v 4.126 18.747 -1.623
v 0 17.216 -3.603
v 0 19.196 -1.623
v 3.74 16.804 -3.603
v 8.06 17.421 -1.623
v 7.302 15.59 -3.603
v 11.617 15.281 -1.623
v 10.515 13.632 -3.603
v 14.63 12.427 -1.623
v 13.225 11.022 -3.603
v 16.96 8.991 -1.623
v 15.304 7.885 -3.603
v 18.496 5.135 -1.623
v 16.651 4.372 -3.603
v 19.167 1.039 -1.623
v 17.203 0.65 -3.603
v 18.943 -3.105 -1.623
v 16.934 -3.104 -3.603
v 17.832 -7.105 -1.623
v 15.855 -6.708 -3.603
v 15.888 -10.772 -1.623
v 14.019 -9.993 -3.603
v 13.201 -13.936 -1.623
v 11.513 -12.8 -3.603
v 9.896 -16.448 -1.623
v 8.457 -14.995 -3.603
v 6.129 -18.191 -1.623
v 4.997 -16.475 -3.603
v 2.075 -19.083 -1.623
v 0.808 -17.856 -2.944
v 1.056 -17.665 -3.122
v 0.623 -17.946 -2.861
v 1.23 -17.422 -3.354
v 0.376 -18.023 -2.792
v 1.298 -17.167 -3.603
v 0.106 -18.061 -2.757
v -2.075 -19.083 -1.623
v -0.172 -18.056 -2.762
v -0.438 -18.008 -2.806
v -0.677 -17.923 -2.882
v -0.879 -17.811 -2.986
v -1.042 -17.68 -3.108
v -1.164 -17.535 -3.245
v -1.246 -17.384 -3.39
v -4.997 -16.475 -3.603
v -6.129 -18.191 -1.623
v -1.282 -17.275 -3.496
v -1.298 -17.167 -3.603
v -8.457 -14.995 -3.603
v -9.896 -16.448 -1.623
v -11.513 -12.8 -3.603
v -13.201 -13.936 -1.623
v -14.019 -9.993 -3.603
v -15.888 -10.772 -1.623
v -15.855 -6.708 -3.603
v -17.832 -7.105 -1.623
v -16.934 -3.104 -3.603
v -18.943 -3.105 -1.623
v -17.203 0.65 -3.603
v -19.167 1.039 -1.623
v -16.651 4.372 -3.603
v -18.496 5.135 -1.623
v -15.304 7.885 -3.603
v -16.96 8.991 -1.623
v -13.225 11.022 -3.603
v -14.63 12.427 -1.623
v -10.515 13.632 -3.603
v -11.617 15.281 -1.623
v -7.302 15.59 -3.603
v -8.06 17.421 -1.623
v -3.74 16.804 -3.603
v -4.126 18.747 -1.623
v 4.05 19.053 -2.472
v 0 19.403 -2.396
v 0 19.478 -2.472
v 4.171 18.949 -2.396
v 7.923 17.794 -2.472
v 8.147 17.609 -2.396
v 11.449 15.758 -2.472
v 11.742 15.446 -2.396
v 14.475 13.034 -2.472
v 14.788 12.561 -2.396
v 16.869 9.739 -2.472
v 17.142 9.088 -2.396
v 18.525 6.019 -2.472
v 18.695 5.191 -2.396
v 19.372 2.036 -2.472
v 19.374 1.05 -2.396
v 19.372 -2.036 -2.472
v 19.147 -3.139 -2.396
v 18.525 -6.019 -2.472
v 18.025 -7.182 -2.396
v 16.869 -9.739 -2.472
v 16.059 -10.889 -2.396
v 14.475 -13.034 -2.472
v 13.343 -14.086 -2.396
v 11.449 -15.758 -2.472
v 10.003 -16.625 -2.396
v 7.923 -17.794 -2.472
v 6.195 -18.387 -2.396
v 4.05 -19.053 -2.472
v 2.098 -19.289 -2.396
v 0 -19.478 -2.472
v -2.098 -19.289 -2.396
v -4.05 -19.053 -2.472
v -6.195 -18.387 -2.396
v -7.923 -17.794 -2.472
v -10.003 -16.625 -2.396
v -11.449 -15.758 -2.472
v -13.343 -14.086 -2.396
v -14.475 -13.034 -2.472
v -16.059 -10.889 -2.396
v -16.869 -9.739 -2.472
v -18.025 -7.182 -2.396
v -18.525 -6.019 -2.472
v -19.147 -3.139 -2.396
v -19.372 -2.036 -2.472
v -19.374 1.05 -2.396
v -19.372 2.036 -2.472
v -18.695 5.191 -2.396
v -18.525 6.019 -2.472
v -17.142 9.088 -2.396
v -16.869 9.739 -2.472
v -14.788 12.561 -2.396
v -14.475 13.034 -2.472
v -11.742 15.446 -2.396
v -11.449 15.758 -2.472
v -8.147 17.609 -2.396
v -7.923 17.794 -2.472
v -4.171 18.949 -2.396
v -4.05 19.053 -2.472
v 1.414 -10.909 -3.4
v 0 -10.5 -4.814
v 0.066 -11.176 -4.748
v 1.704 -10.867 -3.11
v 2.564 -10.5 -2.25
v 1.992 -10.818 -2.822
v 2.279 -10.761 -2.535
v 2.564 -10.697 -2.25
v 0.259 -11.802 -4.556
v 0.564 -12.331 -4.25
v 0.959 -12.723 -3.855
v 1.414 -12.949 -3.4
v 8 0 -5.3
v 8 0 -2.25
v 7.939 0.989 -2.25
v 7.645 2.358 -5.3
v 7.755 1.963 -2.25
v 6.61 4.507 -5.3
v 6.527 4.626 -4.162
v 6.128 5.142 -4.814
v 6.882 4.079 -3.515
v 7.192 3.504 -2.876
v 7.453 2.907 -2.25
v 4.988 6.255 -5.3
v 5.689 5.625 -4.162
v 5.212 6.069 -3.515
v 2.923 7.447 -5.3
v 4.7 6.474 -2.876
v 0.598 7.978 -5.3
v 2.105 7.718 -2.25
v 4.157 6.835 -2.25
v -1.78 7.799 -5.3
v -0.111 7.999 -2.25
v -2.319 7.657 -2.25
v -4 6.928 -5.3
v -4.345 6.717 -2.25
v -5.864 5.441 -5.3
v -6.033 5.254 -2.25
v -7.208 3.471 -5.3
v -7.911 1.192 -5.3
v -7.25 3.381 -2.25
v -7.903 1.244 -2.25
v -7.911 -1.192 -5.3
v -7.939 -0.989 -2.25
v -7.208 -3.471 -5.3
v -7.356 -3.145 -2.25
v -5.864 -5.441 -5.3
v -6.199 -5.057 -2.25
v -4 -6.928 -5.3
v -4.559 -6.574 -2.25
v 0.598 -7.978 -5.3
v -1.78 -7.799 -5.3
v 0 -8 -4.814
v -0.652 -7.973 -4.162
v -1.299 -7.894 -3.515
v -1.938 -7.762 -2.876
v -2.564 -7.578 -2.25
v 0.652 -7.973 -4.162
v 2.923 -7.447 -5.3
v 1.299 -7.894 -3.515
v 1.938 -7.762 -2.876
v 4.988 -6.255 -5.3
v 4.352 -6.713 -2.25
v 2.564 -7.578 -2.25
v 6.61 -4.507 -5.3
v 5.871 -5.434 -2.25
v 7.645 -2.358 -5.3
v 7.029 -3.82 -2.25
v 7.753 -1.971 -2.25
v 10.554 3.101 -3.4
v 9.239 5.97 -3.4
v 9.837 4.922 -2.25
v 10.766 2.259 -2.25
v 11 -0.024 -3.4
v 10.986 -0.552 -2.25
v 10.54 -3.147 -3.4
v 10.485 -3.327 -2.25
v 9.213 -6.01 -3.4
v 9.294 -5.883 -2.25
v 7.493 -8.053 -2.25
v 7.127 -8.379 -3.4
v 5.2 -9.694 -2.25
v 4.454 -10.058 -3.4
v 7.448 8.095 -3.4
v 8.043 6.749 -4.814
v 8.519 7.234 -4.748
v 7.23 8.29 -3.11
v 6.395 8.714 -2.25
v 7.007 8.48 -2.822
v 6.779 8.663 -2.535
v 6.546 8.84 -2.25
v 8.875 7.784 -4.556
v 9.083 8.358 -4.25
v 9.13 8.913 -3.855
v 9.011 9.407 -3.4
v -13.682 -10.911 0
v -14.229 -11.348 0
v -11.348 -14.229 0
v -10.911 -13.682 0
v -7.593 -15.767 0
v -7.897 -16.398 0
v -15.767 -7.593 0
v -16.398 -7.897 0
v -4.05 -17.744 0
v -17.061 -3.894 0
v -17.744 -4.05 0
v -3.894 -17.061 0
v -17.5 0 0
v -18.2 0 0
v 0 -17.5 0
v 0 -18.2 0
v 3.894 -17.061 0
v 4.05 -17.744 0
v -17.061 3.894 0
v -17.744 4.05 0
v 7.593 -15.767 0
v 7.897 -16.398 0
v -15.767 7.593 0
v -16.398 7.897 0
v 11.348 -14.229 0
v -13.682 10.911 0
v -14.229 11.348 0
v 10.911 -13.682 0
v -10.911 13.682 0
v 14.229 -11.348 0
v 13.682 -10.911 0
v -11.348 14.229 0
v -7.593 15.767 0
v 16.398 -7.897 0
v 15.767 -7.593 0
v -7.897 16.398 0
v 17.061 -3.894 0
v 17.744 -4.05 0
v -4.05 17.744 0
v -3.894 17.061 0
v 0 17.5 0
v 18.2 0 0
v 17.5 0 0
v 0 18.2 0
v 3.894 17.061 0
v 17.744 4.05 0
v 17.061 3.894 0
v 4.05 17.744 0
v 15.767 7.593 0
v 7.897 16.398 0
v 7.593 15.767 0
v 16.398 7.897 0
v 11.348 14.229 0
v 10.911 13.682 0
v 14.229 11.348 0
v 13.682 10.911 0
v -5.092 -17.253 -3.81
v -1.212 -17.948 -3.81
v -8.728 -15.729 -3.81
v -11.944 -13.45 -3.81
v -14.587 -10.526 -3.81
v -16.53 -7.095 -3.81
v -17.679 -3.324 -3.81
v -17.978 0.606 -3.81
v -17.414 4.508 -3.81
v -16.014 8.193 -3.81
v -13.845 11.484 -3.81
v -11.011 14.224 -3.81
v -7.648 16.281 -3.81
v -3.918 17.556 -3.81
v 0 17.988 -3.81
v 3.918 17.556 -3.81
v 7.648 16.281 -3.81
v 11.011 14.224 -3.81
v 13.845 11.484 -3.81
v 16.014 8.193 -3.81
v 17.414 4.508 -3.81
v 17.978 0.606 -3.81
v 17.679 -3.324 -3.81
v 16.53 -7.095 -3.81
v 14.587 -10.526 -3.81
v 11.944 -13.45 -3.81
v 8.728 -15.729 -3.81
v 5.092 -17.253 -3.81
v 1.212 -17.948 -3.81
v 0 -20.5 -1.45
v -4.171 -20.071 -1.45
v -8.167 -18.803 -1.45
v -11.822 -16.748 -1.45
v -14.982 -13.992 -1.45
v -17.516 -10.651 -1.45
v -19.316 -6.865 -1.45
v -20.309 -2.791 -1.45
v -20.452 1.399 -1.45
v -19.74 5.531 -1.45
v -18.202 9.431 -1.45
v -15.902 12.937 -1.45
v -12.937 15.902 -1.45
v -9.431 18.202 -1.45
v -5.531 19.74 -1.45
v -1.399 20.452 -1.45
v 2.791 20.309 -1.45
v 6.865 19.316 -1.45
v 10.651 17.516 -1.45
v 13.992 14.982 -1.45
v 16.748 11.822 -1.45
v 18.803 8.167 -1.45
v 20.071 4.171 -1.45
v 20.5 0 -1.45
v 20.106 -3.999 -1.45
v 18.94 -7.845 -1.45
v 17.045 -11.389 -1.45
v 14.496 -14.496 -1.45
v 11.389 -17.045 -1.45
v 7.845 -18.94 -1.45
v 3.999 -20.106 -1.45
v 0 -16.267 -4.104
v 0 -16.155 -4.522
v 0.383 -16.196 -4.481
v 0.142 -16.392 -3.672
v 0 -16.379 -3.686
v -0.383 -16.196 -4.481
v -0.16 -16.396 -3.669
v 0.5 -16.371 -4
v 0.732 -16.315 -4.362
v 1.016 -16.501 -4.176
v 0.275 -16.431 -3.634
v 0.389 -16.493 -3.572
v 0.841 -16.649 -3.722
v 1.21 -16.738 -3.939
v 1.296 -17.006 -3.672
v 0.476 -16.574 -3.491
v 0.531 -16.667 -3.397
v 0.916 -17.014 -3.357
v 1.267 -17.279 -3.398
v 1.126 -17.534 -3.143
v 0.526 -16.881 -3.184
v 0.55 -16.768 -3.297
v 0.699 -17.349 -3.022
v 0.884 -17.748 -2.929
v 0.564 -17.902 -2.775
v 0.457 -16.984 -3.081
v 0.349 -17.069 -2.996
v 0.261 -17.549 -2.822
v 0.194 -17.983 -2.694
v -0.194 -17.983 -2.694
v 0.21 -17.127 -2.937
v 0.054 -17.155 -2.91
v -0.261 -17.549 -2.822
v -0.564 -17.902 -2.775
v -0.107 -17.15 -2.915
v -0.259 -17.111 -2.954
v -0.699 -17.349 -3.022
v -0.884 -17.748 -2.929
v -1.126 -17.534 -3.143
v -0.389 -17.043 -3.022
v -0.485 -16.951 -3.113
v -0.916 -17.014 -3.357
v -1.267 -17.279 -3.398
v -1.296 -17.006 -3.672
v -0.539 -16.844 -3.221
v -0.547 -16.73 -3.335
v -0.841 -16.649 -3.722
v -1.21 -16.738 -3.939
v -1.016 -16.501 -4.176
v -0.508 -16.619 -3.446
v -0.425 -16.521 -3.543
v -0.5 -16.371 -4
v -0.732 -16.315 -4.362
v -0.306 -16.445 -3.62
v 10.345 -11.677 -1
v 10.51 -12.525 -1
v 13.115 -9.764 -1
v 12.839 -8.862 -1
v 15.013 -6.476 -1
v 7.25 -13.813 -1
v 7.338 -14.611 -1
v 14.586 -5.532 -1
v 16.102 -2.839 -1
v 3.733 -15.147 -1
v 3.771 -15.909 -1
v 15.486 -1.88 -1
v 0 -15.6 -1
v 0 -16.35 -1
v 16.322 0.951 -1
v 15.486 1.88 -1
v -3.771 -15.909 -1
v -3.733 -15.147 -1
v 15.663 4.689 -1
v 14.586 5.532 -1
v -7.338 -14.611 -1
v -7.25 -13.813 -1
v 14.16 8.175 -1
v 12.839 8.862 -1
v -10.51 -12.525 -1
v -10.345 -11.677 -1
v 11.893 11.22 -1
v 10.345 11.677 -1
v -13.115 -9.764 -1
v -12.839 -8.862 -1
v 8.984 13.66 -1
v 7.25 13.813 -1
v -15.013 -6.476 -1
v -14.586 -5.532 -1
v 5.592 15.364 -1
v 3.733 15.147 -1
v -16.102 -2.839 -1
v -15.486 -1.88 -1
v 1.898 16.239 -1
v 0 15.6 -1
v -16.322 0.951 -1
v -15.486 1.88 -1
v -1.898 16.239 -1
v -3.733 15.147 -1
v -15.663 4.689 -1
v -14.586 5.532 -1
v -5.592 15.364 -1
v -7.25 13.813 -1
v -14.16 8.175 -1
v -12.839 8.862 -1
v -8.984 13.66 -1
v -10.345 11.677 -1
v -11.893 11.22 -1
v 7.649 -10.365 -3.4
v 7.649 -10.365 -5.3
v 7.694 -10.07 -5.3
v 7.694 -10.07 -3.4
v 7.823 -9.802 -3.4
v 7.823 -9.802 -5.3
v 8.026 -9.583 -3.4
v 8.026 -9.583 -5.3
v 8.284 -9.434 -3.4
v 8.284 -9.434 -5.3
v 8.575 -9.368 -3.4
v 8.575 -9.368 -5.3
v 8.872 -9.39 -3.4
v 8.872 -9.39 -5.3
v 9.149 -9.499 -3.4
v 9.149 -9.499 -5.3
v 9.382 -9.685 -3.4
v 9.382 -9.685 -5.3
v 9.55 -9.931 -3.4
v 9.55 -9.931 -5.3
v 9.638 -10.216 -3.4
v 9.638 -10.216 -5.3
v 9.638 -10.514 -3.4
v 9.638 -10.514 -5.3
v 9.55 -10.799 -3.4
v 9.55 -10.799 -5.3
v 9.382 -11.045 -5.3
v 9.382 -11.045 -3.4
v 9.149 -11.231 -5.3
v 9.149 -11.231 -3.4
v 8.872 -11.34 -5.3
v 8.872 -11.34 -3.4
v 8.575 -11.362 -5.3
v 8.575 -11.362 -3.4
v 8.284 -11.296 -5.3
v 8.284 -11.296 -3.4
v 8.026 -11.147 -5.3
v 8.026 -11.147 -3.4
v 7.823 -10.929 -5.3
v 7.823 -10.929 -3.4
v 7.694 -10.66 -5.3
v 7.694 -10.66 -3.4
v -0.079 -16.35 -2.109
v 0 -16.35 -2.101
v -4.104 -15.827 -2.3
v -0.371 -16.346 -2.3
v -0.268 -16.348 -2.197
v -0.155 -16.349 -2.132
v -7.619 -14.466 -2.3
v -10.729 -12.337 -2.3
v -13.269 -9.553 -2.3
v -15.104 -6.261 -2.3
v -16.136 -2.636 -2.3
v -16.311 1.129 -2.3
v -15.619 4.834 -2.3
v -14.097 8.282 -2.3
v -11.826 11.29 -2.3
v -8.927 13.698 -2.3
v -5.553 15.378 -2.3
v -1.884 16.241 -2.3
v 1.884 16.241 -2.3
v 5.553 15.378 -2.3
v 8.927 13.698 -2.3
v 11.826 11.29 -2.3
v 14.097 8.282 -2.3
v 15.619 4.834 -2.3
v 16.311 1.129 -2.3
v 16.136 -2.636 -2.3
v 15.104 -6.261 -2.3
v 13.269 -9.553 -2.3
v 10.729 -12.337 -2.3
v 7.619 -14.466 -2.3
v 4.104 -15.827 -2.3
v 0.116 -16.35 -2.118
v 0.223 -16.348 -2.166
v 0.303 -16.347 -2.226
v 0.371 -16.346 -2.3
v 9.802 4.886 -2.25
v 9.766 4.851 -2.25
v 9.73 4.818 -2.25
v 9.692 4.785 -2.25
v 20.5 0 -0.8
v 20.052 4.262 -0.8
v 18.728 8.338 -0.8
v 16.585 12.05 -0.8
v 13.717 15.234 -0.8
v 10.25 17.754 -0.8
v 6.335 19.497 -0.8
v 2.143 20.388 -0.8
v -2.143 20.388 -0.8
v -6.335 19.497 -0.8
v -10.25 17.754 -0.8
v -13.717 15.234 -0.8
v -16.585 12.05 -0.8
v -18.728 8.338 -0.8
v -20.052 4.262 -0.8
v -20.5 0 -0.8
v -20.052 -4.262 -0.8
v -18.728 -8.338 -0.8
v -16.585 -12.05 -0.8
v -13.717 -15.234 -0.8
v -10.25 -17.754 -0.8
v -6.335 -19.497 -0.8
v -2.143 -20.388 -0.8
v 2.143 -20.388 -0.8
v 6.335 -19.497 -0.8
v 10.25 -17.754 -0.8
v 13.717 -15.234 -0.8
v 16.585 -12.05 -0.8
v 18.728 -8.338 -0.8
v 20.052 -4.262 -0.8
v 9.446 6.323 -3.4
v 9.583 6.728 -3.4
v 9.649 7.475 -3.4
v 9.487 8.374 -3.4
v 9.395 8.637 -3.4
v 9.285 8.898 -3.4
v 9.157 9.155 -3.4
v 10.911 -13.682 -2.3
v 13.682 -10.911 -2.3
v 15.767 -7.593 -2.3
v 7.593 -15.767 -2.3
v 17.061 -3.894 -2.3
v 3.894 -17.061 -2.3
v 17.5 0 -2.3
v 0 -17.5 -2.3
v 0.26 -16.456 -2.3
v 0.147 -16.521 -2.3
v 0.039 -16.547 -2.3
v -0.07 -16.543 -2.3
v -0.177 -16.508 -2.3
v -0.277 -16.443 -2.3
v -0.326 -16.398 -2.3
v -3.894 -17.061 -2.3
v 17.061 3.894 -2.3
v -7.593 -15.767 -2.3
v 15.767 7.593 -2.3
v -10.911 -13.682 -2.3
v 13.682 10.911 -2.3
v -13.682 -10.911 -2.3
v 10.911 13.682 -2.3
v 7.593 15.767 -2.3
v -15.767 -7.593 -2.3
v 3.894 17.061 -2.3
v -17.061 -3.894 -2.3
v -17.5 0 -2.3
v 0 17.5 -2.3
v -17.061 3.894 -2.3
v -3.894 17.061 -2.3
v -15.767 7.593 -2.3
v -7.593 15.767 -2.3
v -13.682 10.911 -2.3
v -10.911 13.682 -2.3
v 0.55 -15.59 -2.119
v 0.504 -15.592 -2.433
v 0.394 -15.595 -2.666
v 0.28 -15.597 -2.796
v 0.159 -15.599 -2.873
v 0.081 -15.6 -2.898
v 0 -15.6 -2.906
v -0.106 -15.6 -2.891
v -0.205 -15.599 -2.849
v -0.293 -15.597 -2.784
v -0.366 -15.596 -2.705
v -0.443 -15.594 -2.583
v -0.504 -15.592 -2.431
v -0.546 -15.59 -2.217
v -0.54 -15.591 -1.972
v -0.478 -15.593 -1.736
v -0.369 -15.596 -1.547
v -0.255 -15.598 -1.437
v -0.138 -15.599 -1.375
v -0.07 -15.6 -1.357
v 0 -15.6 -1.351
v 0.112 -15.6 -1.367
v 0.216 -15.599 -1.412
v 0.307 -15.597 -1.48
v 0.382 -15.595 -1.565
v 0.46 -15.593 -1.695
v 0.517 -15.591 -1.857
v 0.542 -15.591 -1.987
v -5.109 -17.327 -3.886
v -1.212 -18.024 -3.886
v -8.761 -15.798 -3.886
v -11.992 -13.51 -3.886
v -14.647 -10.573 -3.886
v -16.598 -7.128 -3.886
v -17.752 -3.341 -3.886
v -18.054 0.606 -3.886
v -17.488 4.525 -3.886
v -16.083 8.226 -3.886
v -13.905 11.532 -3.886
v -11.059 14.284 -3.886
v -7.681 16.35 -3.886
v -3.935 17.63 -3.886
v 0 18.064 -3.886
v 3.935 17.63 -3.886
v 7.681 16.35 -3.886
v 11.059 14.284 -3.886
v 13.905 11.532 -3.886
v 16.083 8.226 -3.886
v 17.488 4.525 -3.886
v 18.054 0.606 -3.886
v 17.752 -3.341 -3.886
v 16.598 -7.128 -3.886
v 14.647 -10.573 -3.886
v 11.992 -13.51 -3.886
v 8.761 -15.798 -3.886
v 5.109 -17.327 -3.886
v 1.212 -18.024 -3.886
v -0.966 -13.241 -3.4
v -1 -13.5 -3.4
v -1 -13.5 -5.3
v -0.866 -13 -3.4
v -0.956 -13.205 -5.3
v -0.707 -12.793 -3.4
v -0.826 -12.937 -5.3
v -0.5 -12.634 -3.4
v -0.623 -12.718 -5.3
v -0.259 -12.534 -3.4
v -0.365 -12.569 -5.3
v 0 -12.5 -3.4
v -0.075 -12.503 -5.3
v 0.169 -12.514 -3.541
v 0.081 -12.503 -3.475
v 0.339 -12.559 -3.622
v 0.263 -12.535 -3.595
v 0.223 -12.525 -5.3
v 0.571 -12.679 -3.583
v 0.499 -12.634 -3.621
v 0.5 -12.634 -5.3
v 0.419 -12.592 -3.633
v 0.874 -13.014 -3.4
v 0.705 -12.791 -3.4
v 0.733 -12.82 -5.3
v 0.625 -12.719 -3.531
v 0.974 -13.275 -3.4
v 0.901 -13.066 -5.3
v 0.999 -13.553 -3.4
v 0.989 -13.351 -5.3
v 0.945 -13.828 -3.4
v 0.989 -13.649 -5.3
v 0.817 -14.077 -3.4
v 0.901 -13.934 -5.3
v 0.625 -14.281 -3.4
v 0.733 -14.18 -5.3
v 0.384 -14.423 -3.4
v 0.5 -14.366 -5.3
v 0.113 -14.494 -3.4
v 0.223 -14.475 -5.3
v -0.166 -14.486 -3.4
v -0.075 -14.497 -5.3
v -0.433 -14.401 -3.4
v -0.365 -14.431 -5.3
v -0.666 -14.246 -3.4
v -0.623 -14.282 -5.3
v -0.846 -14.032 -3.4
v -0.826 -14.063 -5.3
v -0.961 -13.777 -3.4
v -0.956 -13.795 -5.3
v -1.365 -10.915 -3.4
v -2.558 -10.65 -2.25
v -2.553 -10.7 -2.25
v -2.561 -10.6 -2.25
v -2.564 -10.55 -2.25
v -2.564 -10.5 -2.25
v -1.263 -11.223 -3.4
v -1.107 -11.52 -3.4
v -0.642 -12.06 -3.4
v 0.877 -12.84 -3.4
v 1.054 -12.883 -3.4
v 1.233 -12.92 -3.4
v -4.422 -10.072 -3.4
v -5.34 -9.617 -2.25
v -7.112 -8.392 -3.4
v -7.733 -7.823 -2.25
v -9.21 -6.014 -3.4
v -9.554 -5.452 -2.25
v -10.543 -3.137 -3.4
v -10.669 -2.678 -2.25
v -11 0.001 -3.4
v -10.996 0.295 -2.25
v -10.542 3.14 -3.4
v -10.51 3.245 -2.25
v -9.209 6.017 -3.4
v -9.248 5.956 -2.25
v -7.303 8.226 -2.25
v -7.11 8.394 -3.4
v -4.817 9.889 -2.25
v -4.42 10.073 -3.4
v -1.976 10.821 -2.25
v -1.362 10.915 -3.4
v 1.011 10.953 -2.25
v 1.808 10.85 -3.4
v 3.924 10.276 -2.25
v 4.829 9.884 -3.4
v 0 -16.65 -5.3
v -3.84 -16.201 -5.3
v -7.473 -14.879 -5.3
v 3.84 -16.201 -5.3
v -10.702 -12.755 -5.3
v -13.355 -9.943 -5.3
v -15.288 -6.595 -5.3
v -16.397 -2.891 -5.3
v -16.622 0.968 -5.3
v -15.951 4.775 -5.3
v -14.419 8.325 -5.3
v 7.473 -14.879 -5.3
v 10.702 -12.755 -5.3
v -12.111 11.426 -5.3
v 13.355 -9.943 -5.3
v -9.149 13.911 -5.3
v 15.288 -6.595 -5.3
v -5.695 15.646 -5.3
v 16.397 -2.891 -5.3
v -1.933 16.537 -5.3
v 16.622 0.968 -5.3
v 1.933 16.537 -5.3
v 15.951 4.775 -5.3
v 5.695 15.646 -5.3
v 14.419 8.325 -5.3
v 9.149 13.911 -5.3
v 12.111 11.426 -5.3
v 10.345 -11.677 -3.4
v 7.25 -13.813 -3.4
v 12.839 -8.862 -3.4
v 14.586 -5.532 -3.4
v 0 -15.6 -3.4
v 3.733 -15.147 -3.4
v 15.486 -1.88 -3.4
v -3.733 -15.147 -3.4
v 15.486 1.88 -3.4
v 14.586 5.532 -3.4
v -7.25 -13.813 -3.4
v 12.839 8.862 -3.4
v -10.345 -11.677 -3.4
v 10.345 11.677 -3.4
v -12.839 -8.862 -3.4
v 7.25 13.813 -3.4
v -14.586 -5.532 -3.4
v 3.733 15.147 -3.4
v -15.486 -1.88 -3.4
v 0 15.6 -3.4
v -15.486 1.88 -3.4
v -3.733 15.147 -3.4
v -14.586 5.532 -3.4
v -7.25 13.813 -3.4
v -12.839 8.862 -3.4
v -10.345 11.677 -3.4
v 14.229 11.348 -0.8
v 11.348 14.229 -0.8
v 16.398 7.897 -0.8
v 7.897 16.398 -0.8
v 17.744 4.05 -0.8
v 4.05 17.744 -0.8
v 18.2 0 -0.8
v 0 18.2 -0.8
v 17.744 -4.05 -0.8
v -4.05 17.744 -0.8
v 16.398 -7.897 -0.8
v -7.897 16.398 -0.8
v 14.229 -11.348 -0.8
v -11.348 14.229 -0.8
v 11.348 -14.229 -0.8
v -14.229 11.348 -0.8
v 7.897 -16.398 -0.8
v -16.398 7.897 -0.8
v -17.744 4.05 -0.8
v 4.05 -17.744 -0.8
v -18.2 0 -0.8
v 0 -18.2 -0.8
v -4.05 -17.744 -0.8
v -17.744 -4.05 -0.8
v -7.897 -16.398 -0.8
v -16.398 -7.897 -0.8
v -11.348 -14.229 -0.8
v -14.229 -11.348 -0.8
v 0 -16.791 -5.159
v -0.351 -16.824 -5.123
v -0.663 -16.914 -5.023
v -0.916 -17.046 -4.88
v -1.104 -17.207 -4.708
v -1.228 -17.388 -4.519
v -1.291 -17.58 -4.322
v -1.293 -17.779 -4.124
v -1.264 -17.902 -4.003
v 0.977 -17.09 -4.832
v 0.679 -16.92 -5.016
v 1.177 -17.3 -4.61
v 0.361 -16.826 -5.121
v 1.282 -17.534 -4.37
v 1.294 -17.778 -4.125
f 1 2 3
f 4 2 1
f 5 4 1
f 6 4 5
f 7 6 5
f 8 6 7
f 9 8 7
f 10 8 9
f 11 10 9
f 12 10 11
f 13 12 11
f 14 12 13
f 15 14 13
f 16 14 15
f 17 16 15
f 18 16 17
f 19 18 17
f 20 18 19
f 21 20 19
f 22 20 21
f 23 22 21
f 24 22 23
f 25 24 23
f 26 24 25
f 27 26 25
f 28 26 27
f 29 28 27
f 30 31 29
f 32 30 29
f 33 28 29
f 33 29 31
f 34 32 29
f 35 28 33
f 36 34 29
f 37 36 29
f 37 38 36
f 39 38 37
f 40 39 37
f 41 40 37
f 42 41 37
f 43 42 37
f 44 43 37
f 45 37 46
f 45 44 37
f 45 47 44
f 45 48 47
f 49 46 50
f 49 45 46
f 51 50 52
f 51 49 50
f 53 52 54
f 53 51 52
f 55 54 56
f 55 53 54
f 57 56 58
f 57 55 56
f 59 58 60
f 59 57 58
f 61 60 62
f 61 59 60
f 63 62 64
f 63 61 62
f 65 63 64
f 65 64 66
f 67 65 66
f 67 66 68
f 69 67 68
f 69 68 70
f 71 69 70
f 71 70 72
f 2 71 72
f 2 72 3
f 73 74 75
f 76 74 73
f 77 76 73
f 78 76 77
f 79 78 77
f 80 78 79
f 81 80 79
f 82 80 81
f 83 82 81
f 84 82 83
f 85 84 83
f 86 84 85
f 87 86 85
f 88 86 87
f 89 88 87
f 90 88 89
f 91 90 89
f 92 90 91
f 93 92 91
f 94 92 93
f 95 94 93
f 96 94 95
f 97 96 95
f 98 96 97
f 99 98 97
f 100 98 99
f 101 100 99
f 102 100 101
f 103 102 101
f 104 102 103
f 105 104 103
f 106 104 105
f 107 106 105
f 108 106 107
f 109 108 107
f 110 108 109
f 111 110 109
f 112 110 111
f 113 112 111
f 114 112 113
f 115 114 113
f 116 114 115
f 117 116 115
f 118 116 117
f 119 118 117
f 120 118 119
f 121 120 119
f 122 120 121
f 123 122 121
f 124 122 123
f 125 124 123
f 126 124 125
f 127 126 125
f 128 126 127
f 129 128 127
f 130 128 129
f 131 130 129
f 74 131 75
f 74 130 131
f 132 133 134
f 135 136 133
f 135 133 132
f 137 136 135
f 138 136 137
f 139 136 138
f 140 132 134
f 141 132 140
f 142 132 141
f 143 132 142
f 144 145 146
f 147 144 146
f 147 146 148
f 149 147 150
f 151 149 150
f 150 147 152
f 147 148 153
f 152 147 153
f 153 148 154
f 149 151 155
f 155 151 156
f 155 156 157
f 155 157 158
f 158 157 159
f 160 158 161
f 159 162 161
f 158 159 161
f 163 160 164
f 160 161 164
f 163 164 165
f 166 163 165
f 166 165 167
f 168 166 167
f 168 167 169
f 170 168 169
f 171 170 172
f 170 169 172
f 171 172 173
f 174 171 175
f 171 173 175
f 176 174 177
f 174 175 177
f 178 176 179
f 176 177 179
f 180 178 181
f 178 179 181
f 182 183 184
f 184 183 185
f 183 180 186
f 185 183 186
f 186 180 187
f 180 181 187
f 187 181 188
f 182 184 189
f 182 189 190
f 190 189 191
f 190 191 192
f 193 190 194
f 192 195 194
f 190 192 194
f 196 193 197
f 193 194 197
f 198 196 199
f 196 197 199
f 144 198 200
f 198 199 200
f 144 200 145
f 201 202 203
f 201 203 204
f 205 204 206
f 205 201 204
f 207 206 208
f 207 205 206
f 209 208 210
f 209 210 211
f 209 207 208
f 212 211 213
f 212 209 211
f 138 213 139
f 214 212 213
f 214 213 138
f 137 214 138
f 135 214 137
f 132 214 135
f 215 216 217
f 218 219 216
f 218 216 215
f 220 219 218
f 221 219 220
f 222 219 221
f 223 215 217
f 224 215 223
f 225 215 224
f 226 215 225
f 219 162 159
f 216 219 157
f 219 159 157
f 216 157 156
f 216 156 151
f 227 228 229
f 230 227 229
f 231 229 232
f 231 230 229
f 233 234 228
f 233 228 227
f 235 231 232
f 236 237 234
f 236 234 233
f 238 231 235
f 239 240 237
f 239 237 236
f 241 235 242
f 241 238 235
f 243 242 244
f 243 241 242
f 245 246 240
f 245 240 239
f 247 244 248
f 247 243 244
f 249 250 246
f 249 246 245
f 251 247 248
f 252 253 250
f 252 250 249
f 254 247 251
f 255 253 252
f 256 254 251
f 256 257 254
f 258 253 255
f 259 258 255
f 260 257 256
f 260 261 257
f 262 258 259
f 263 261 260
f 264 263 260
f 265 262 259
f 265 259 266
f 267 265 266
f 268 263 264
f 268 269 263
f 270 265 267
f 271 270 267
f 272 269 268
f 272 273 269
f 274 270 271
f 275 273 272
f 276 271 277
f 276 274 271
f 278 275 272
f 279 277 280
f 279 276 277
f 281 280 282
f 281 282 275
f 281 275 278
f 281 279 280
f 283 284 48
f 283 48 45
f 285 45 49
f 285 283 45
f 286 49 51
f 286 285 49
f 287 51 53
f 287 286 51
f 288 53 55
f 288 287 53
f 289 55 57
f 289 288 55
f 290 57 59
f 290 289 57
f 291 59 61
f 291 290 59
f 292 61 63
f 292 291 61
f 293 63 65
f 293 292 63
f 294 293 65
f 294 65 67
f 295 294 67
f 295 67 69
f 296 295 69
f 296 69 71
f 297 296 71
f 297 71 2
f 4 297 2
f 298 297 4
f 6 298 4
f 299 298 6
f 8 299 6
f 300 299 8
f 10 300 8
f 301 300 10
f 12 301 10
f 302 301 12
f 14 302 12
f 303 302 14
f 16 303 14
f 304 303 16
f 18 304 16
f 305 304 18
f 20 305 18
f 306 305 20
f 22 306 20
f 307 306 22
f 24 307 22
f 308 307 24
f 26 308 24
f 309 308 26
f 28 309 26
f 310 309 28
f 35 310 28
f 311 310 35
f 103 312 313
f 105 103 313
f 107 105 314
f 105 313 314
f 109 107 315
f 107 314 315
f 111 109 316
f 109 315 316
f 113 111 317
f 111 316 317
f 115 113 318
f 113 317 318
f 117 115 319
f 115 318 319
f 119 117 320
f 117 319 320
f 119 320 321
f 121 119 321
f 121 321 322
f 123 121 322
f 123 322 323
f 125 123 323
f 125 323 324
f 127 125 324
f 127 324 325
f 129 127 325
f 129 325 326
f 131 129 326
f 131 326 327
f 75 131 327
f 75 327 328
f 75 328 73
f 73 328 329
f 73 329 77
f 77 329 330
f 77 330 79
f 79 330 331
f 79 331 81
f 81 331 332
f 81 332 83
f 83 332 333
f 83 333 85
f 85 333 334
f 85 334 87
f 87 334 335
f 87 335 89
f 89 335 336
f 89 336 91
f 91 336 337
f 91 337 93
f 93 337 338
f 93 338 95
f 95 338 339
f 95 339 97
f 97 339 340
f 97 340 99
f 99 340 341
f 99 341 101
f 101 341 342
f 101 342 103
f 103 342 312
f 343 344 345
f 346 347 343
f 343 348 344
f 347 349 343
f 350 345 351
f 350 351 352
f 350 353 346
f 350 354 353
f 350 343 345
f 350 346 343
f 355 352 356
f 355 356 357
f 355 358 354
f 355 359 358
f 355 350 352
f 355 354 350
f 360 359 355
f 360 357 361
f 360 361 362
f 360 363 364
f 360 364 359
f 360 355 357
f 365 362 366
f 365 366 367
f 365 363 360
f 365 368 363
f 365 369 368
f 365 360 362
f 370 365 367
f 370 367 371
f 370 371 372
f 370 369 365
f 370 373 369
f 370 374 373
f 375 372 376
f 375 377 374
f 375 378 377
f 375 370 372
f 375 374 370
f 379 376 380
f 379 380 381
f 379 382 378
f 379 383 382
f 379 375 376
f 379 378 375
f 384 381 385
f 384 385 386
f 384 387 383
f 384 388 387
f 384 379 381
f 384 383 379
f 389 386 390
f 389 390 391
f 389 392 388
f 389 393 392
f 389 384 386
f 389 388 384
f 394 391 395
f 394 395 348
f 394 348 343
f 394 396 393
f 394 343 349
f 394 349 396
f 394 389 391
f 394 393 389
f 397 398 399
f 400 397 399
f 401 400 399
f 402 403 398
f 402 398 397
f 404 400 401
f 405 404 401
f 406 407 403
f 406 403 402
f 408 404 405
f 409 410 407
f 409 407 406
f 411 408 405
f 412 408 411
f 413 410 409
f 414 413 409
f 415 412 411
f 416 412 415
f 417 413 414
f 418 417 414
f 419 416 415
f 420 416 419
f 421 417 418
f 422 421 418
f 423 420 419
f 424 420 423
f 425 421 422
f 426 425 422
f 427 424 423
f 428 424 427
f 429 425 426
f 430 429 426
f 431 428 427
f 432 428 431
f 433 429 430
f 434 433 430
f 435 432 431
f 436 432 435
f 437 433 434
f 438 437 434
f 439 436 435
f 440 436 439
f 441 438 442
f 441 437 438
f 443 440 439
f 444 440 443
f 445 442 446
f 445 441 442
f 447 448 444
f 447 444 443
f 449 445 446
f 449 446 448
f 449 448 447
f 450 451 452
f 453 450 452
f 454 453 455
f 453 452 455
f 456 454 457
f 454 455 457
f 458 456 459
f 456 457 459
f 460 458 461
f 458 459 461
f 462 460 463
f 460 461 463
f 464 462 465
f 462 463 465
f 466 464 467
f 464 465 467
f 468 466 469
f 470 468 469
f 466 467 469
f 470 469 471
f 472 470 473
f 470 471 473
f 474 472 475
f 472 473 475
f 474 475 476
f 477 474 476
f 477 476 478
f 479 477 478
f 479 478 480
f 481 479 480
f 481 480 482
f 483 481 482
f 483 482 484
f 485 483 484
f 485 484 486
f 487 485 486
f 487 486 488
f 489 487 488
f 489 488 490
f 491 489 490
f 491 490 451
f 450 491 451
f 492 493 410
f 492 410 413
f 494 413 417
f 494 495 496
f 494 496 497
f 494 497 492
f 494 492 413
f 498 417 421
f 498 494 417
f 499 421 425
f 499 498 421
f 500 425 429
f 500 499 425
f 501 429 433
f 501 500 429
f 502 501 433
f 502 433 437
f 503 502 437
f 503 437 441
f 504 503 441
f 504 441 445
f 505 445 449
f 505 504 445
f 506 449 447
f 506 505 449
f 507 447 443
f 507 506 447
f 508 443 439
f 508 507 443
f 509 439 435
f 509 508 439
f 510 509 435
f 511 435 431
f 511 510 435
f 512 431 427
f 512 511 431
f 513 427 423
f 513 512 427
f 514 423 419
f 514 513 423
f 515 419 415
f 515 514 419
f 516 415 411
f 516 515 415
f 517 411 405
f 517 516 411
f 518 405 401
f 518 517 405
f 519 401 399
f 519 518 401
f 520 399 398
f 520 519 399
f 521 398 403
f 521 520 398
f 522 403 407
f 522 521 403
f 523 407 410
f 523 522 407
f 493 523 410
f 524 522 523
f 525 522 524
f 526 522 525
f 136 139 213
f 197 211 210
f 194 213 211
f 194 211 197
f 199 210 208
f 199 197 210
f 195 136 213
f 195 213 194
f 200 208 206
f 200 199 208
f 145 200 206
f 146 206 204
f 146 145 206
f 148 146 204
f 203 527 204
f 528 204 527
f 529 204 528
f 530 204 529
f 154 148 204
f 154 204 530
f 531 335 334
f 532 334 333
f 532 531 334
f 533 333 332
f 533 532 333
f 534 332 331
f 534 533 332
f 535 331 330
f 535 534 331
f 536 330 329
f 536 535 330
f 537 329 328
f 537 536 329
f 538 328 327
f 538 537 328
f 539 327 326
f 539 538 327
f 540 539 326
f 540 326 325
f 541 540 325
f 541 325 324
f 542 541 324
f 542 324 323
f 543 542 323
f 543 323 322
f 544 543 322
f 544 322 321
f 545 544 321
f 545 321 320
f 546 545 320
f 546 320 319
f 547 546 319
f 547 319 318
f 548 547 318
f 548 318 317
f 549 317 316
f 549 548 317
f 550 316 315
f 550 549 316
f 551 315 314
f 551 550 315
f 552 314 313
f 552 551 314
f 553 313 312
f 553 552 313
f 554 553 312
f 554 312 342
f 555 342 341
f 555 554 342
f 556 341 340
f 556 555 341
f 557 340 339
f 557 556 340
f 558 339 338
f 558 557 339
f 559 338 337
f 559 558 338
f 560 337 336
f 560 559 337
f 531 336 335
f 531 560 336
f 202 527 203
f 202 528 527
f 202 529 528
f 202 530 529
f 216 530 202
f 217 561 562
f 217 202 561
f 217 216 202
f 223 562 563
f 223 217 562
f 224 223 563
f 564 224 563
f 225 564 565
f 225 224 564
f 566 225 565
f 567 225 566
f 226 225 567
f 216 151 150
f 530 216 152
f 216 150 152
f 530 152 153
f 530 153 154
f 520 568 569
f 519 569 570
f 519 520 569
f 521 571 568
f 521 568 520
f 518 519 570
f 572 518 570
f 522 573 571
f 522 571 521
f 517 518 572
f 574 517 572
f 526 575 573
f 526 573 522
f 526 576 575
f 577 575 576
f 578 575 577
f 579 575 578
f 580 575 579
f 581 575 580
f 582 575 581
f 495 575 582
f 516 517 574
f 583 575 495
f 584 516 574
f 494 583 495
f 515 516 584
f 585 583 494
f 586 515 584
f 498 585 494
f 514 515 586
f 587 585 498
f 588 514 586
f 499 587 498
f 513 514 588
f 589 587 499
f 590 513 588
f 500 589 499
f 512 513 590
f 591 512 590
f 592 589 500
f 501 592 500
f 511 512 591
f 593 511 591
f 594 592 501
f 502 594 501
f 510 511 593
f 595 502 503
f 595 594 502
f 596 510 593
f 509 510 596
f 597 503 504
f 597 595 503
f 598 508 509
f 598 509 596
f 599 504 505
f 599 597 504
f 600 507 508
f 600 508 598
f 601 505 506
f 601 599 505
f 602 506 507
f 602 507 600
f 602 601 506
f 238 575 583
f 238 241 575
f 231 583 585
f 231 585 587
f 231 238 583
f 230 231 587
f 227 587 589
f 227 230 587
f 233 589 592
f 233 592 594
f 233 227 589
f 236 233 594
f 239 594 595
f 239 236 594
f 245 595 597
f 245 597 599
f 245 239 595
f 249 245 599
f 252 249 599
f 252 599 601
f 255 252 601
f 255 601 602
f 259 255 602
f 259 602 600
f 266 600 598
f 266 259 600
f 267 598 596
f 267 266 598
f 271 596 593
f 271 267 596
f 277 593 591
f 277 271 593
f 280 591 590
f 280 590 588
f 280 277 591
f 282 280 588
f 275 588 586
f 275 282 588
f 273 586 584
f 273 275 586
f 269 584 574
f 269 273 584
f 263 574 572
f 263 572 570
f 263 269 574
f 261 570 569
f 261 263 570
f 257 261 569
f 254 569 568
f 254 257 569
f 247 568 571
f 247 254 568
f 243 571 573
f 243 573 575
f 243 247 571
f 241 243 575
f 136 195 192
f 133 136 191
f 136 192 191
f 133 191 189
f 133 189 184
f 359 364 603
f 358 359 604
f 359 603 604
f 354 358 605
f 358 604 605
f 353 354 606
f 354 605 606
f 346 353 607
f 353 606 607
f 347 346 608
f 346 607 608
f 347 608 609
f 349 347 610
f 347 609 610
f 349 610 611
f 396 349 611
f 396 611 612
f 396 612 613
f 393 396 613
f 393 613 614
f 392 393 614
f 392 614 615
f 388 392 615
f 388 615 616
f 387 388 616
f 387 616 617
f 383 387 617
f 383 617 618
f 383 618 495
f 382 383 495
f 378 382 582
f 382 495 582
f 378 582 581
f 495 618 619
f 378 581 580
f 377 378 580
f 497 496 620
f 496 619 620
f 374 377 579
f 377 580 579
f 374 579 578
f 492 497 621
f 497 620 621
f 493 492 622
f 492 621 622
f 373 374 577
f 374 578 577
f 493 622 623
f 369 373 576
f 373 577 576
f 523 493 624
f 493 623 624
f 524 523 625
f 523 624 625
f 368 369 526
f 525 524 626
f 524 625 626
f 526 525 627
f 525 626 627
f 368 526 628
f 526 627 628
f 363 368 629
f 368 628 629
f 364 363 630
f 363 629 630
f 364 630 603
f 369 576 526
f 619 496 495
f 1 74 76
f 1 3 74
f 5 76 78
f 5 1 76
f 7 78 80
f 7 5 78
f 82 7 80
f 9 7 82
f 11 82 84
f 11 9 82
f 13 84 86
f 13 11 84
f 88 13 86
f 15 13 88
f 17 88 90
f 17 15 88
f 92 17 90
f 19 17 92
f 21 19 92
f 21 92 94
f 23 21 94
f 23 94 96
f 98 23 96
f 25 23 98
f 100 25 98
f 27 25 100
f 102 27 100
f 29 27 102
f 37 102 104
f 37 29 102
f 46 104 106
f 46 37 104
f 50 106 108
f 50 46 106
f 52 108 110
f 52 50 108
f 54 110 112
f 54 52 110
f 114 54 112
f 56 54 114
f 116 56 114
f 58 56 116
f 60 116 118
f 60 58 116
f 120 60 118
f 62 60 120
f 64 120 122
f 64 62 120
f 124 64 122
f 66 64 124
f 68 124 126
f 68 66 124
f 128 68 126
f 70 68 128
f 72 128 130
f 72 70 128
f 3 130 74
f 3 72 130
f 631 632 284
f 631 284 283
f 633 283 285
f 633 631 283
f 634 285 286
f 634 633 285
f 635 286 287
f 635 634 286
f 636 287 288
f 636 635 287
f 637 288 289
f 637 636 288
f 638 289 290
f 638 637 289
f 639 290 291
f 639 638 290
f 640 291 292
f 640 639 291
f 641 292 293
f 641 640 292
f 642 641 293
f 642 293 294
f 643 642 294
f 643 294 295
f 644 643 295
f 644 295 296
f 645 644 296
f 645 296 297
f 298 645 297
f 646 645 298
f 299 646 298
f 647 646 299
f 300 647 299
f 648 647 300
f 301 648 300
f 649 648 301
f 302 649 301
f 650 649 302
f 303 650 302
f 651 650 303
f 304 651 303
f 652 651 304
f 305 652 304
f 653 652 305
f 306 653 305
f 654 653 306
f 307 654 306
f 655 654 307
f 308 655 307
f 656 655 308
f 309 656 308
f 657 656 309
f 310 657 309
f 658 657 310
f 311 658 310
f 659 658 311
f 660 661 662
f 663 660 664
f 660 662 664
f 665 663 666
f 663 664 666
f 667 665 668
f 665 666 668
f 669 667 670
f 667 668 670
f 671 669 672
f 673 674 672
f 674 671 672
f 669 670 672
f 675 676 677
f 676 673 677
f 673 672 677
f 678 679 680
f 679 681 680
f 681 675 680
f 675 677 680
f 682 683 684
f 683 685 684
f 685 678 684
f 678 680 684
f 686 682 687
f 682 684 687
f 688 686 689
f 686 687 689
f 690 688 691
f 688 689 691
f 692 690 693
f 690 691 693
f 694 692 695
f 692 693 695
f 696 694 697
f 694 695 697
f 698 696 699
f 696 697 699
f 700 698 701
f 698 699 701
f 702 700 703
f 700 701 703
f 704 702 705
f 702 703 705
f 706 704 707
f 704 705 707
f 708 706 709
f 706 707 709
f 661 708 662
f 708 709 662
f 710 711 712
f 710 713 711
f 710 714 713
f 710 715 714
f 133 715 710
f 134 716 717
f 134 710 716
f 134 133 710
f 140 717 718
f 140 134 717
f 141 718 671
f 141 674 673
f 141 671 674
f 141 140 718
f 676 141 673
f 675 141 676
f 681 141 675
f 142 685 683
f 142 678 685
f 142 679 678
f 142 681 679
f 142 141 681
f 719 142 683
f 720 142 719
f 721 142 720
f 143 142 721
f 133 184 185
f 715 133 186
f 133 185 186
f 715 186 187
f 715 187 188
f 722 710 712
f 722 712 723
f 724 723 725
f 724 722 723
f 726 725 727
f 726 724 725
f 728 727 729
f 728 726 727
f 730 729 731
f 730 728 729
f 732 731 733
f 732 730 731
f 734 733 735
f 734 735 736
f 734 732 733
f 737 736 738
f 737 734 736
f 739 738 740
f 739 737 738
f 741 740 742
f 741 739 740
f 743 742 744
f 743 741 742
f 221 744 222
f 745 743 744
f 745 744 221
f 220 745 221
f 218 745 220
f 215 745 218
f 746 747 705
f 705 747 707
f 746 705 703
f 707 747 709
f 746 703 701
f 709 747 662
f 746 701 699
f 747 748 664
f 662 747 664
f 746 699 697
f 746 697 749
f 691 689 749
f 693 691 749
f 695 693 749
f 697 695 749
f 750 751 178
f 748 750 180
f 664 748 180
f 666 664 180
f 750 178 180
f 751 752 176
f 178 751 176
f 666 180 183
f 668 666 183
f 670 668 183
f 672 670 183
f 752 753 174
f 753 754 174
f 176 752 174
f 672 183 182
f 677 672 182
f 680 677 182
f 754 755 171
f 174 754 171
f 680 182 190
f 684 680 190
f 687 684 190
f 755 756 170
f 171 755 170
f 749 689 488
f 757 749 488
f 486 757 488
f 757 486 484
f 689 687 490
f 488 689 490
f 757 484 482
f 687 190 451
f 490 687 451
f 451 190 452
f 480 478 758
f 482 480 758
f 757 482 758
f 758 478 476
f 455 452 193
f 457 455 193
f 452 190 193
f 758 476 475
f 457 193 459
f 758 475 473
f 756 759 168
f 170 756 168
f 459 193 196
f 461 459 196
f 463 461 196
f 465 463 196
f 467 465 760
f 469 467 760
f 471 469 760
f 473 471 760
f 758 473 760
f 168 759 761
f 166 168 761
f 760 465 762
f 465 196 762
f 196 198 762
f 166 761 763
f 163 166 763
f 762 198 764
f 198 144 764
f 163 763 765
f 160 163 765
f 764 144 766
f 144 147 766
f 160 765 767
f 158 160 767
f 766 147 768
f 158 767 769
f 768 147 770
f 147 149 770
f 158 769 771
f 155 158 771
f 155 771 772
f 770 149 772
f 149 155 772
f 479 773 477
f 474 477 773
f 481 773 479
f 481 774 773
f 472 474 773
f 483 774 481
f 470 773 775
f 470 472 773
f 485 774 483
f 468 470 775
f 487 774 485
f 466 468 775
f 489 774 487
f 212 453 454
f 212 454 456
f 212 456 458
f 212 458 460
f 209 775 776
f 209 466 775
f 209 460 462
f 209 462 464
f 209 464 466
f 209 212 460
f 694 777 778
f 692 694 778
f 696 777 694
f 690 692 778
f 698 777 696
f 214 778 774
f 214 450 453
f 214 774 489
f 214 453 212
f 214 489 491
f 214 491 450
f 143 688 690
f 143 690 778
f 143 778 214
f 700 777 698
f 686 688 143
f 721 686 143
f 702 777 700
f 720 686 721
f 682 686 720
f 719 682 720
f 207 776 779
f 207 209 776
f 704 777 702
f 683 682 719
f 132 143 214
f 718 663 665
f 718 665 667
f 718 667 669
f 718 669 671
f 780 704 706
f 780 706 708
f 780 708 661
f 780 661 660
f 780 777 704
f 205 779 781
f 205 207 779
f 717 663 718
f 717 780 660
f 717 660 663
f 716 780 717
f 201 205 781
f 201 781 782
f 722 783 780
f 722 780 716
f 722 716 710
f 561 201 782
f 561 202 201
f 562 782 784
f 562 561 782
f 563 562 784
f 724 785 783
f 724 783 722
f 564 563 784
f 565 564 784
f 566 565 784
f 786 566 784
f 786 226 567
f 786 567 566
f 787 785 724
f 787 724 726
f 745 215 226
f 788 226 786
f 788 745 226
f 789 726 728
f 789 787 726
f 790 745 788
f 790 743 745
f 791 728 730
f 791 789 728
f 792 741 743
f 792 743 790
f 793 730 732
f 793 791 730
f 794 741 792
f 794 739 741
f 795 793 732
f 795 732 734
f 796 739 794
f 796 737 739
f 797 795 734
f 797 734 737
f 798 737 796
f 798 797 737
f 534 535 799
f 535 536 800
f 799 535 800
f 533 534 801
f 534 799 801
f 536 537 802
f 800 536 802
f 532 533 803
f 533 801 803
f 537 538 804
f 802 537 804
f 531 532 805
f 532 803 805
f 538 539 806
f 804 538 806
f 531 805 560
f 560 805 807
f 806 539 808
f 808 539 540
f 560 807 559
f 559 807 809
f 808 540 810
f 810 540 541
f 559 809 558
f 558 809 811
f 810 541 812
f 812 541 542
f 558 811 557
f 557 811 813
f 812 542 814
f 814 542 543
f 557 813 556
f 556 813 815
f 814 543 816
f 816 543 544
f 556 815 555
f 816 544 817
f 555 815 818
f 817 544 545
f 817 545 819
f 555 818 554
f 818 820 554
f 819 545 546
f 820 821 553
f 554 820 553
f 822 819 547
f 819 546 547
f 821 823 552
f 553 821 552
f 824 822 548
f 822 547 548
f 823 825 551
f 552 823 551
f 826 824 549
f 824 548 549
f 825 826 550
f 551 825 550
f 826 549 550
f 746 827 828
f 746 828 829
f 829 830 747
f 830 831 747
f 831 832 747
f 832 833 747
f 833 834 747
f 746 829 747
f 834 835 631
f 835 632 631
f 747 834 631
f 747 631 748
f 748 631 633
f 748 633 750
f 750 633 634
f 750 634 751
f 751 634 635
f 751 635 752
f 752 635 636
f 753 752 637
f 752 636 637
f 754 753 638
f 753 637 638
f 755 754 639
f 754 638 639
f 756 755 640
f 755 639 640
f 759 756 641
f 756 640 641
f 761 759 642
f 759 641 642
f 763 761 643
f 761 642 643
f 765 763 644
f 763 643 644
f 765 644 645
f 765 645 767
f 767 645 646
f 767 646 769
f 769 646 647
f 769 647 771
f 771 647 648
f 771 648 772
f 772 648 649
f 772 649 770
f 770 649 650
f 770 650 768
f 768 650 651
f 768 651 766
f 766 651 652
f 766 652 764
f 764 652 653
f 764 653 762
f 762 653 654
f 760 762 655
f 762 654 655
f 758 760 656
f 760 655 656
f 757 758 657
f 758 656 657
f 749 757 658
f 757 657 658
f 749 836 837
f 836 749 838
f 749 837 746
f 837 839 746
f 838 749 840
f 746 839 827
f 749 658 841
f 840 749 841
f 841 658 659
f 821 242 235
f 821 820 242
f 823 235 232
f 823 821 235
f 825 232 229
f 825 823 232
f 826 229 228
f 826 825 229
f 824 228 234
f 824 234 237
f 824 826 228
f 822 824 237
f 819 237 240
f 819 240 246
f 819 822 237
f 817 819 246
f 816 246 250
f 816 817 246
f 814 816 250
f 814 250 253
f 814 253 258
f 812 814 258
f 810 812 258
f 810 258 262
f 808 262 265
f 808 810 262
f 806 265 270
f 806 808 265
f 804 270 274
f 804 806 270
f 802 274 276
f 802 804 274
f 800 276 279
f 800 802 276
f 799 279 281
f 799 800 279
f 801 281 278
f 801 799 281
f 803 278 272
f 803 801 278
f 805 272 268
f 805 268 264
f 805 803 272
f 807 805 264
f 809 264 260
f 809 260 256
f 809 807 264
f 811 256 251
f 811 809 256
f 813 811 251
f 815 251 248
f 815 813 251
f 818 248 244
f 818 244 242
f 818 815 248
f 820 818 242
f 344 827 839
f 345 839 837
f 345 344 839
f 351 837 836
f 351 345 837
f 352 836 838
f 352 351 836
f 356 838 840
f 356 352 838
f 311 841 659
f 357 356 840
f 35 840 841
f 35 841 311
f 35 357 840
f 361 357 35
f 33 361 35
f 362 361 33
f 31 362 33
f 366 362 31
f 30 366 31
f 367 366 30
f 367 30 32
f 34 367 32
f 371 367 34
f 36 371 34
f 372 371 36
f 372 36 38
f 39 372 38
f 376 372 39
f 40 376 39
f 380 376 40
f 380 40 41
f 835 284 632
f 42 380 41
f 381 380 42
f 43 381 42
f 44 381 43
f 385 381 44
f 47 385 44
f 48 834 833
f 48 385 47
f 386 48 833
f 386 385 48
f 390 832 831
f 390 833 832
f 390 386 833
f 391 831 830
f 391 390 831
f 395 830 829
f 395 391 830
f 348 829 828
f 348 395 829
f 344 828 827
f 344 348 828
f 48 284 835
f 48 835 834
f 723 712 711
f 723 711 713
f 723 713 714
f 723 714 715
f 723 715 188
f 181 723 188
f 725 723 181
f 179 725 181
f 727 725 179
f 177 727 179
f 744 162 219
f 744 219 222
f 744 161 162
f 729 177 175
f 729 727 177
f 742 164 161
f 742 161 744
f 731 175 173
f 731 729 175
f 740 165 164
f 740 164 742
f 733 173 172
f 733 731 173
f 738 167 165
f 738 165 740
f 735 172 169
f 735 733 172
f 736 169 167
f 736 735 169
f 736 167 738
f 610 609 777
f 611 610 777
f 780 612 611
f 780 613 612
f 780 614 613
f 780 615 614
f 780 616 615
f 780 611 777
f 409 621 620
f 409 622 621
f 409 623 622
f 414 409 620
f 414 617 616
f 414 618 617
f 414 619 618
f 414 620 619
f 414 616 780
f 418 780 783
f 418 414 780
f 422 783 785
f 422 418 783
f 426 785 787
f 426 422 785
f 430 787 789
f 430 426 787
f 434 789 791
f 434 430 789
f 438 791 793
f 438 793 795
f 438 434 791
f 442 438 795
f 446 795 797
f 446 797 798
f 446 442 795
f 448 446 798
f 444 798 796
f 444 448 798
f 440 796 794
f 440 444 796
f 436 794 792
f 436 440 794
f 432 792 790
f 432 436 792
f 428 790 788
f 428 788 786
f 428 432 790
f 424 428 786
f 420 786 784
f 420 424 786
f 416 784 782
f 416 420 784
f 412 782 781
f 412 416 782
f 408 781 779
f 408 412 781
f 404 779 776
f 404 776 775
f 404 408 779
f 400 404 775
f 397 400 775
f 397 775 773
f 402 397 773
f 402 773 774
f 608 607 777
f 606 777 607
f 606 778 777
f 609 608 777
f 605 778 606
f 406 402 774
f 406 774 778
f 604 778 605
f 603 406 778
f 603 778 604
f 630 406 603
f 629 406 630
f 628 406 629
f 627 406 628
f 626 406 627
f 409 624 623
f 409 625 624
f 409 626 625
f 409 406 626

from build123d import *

# Parameters (mm, degrees)
SKETCH1_R                    = 20.5
BOSS_EXTRUDE1_DEPTH          = 5.3
SKETCH4_R                    = 8
CUT_EXTRUDE1_DEPTH           = 6.3
SKETCH6_W                    = 0.8
SKETCH6_H                    = 2.3
CUT_EXTRUDE2_DEPTH           = 10.5
CIRPATTERN3_COUNT            = 2
CIRPATTERN3_ANGLE            = 130
F_2_0_2_DIAMETER_HOLE1_D     = 2
F_2_0_2_DIAMETER_HOLE1_DEPTH = 1.9
M1_4X0_3_TAPPED_HOLE1_D      = 1.1
SKETCH41_R                   = 2.5
CUT_EXTRUDE9_DEPTH           = 3.626346
CIRPATTERN11_COUNT           = 2
CIRPATTERN11_ANGLE           = 130


with BuildPart() as part:
    # Sketch1 → Boss-Extrude1 (new body)
    with BuildSketch(Plane.XY):
        Circle(SKETCH1_R)
    extrude(amount=-BOSS_EXTRUDE1_DEPTH)

    # Sketch4 → Cut-Extrude1 (cut, through all)
    with BuildSketch(Plane.XY):
        Circle(SKETCH4_R)
    extrude(amount=-CUT_EXTRUDE1_DEPTH, mode=Mode.SUBTRACT)

    # Sketch3 → Cut-Revolve1 (revolve, cut)
    with BuildSketch(Plane(origin=(0, 0, 0), x_dir=(0, 0, -1), z_dir=(1, 0, 0))):
        Polygon((2.25, 0), (2.25, -11), (3.4, -11), (3.4, -15.6), (1, -15.6), (1, -16.35), (2.3, -16.35), (2.3, -17.5), (0, -17.5), (0, 0), align=None)
    revolve(axis=Axis((0, 0, 0), (0, 0, -1)), mode=Mode.SUBTRACT)

    # Sketch6 → Cut-Revolve2 (revolve, cut)
    with BuildSketch(Plane(origin=(0, 0, 0), x_dir=(0, 0, -1), z_dir=(1, 0, 0))):
        with Locations((0.4, -19.35)):
            Rectangle(SKETCH6_W, SKETCH6_H)
        Polygon((5.3, -16.65), (1.45, -20.5), (5.3, -20.5), align=None)
    revolve(axis=Axis((0, 0, 0), (0, 0, -1)), mode=Mode.SUBTRACT)

    # Sketch7 → Cut-Revolve3 (revolve, cut)
    with BuildSketch(Plane(origin=(0, 0, 0), x_dir=(0, 0, -1), z_dir=(1, 0, 0))):
        Polygon((1.623044738, 19.195584412), (3.602943725, 17.215685425), (3.809998961, 17.988426086), (3.885786438, 18.064213562), (2.471572875, 19.478427125), (2.395785399, 19.402639648), align=None)
    revolve(axis=Axis((0, 0, 0), (0, 0, -1)), mode=Mode.SUBTRACT)

    # Sketch12 → Cut-Extrude2 (cut)
    with BuildSketch(Plane(origin=(0, 0, 0), x_dir=(1, 0, 0), z_dir=(0, 1, 0))):
        Polygon((0, 4.814213562), (-2.564213562, 2.25), (2.564213562, 2.25), align=None)
    cut_extrude2 = extrude(amount=-CUT_EXTRUDE2_DEPTH, mode=Mode.SUBTRACT)

    # CirPattern3: Cut-Extrude2 ×2 about axis
    cirpattern3_axis = Axis((0, 0, 0), (0, 0, 1))
    for i in range(1, CIRPATTERN3_COUNT):
        add(cut_extrude2.rotate(cirpattern3_axis, i * CIRPATTERN3_ANGLE / (CIRPATTERN3_COUNT - 1)), mode=Mode.SUBTRACT)

    # 2.0 _2_ Diameter Hole1
    with Locations(Plane.XY.offset(-3.4)):
        with Locations((0, -13.5), (8.649447154, -10.365185185)):
            Hole(F_2_0_2_DIAMETER_HOLE1_D / 2, depth=F_2_0_2_DIAMETER_HOLE1_DEPTH)

    # Sketch26 → Cut-Revolve4 (revolve, cut)
    with BuildSketch(Plane(origin=(0, 0, 0), x_dir=(0, 0, -1), z_dir=(1, 0, 0))):
        Polygon((5.158578644, -16.791421356), (4.522182541, -16.155025253), (3.685666237, -16.379169121), (3.296757507, -16.768077851), (4.239339828, -17.710660172), align=None)
    revolve(axis=Axis((0, -16.508472243, -3.037151899), (0, -0.707106781, -0.707106781)), mode=Mode.SUBTRACT)

    # M1.4x0.3 Tapped Hole1 (through all)
    with Locations(Plane(origin=(0, -10.032417679, -10.032417679), x_dir=(-1, 0, 0), z_dir=(0, -0.707106781, -0.707106781))):
        with Locations((0, -9.525661966)):
            Hole(M1_4X0_3_TAPPED_HOLE1_D / 2)

    # Sketch41 → Cut-Extrude9 (cut)
    with BuildSketch(Plane(origin=(-1.547258414, 1.843950774, -2.407106781), x_dir=(0.890736799, 0.276402568, -0.360817927), z_dir=(0.454519478, -0.54167522, 0.707106781))):
        with Locations((9.491497809, 4.580281669)):
            Circle(SKETCH41_R)
    cut_extrude9 = extrude(amount=CUT_EXTRUDE9_DEPTH, mode=Mode.SUBTRACT)

    # CirPattern11: Cut-Extrude9 ×2 about axis
    cirpattern11_axis = Axis((0, 0, 0), (0, 0, -1))
    for i in range(1, CIRPATTERN11_COUNT):
        add(cut_extrude9.rotate(cirpattern11_axis, i * CIRPATTERN11_ANGLE / (CIRPATTERN11_COUNT - 1)), mode=Mode.SUBTRACT)


solid = part.part
